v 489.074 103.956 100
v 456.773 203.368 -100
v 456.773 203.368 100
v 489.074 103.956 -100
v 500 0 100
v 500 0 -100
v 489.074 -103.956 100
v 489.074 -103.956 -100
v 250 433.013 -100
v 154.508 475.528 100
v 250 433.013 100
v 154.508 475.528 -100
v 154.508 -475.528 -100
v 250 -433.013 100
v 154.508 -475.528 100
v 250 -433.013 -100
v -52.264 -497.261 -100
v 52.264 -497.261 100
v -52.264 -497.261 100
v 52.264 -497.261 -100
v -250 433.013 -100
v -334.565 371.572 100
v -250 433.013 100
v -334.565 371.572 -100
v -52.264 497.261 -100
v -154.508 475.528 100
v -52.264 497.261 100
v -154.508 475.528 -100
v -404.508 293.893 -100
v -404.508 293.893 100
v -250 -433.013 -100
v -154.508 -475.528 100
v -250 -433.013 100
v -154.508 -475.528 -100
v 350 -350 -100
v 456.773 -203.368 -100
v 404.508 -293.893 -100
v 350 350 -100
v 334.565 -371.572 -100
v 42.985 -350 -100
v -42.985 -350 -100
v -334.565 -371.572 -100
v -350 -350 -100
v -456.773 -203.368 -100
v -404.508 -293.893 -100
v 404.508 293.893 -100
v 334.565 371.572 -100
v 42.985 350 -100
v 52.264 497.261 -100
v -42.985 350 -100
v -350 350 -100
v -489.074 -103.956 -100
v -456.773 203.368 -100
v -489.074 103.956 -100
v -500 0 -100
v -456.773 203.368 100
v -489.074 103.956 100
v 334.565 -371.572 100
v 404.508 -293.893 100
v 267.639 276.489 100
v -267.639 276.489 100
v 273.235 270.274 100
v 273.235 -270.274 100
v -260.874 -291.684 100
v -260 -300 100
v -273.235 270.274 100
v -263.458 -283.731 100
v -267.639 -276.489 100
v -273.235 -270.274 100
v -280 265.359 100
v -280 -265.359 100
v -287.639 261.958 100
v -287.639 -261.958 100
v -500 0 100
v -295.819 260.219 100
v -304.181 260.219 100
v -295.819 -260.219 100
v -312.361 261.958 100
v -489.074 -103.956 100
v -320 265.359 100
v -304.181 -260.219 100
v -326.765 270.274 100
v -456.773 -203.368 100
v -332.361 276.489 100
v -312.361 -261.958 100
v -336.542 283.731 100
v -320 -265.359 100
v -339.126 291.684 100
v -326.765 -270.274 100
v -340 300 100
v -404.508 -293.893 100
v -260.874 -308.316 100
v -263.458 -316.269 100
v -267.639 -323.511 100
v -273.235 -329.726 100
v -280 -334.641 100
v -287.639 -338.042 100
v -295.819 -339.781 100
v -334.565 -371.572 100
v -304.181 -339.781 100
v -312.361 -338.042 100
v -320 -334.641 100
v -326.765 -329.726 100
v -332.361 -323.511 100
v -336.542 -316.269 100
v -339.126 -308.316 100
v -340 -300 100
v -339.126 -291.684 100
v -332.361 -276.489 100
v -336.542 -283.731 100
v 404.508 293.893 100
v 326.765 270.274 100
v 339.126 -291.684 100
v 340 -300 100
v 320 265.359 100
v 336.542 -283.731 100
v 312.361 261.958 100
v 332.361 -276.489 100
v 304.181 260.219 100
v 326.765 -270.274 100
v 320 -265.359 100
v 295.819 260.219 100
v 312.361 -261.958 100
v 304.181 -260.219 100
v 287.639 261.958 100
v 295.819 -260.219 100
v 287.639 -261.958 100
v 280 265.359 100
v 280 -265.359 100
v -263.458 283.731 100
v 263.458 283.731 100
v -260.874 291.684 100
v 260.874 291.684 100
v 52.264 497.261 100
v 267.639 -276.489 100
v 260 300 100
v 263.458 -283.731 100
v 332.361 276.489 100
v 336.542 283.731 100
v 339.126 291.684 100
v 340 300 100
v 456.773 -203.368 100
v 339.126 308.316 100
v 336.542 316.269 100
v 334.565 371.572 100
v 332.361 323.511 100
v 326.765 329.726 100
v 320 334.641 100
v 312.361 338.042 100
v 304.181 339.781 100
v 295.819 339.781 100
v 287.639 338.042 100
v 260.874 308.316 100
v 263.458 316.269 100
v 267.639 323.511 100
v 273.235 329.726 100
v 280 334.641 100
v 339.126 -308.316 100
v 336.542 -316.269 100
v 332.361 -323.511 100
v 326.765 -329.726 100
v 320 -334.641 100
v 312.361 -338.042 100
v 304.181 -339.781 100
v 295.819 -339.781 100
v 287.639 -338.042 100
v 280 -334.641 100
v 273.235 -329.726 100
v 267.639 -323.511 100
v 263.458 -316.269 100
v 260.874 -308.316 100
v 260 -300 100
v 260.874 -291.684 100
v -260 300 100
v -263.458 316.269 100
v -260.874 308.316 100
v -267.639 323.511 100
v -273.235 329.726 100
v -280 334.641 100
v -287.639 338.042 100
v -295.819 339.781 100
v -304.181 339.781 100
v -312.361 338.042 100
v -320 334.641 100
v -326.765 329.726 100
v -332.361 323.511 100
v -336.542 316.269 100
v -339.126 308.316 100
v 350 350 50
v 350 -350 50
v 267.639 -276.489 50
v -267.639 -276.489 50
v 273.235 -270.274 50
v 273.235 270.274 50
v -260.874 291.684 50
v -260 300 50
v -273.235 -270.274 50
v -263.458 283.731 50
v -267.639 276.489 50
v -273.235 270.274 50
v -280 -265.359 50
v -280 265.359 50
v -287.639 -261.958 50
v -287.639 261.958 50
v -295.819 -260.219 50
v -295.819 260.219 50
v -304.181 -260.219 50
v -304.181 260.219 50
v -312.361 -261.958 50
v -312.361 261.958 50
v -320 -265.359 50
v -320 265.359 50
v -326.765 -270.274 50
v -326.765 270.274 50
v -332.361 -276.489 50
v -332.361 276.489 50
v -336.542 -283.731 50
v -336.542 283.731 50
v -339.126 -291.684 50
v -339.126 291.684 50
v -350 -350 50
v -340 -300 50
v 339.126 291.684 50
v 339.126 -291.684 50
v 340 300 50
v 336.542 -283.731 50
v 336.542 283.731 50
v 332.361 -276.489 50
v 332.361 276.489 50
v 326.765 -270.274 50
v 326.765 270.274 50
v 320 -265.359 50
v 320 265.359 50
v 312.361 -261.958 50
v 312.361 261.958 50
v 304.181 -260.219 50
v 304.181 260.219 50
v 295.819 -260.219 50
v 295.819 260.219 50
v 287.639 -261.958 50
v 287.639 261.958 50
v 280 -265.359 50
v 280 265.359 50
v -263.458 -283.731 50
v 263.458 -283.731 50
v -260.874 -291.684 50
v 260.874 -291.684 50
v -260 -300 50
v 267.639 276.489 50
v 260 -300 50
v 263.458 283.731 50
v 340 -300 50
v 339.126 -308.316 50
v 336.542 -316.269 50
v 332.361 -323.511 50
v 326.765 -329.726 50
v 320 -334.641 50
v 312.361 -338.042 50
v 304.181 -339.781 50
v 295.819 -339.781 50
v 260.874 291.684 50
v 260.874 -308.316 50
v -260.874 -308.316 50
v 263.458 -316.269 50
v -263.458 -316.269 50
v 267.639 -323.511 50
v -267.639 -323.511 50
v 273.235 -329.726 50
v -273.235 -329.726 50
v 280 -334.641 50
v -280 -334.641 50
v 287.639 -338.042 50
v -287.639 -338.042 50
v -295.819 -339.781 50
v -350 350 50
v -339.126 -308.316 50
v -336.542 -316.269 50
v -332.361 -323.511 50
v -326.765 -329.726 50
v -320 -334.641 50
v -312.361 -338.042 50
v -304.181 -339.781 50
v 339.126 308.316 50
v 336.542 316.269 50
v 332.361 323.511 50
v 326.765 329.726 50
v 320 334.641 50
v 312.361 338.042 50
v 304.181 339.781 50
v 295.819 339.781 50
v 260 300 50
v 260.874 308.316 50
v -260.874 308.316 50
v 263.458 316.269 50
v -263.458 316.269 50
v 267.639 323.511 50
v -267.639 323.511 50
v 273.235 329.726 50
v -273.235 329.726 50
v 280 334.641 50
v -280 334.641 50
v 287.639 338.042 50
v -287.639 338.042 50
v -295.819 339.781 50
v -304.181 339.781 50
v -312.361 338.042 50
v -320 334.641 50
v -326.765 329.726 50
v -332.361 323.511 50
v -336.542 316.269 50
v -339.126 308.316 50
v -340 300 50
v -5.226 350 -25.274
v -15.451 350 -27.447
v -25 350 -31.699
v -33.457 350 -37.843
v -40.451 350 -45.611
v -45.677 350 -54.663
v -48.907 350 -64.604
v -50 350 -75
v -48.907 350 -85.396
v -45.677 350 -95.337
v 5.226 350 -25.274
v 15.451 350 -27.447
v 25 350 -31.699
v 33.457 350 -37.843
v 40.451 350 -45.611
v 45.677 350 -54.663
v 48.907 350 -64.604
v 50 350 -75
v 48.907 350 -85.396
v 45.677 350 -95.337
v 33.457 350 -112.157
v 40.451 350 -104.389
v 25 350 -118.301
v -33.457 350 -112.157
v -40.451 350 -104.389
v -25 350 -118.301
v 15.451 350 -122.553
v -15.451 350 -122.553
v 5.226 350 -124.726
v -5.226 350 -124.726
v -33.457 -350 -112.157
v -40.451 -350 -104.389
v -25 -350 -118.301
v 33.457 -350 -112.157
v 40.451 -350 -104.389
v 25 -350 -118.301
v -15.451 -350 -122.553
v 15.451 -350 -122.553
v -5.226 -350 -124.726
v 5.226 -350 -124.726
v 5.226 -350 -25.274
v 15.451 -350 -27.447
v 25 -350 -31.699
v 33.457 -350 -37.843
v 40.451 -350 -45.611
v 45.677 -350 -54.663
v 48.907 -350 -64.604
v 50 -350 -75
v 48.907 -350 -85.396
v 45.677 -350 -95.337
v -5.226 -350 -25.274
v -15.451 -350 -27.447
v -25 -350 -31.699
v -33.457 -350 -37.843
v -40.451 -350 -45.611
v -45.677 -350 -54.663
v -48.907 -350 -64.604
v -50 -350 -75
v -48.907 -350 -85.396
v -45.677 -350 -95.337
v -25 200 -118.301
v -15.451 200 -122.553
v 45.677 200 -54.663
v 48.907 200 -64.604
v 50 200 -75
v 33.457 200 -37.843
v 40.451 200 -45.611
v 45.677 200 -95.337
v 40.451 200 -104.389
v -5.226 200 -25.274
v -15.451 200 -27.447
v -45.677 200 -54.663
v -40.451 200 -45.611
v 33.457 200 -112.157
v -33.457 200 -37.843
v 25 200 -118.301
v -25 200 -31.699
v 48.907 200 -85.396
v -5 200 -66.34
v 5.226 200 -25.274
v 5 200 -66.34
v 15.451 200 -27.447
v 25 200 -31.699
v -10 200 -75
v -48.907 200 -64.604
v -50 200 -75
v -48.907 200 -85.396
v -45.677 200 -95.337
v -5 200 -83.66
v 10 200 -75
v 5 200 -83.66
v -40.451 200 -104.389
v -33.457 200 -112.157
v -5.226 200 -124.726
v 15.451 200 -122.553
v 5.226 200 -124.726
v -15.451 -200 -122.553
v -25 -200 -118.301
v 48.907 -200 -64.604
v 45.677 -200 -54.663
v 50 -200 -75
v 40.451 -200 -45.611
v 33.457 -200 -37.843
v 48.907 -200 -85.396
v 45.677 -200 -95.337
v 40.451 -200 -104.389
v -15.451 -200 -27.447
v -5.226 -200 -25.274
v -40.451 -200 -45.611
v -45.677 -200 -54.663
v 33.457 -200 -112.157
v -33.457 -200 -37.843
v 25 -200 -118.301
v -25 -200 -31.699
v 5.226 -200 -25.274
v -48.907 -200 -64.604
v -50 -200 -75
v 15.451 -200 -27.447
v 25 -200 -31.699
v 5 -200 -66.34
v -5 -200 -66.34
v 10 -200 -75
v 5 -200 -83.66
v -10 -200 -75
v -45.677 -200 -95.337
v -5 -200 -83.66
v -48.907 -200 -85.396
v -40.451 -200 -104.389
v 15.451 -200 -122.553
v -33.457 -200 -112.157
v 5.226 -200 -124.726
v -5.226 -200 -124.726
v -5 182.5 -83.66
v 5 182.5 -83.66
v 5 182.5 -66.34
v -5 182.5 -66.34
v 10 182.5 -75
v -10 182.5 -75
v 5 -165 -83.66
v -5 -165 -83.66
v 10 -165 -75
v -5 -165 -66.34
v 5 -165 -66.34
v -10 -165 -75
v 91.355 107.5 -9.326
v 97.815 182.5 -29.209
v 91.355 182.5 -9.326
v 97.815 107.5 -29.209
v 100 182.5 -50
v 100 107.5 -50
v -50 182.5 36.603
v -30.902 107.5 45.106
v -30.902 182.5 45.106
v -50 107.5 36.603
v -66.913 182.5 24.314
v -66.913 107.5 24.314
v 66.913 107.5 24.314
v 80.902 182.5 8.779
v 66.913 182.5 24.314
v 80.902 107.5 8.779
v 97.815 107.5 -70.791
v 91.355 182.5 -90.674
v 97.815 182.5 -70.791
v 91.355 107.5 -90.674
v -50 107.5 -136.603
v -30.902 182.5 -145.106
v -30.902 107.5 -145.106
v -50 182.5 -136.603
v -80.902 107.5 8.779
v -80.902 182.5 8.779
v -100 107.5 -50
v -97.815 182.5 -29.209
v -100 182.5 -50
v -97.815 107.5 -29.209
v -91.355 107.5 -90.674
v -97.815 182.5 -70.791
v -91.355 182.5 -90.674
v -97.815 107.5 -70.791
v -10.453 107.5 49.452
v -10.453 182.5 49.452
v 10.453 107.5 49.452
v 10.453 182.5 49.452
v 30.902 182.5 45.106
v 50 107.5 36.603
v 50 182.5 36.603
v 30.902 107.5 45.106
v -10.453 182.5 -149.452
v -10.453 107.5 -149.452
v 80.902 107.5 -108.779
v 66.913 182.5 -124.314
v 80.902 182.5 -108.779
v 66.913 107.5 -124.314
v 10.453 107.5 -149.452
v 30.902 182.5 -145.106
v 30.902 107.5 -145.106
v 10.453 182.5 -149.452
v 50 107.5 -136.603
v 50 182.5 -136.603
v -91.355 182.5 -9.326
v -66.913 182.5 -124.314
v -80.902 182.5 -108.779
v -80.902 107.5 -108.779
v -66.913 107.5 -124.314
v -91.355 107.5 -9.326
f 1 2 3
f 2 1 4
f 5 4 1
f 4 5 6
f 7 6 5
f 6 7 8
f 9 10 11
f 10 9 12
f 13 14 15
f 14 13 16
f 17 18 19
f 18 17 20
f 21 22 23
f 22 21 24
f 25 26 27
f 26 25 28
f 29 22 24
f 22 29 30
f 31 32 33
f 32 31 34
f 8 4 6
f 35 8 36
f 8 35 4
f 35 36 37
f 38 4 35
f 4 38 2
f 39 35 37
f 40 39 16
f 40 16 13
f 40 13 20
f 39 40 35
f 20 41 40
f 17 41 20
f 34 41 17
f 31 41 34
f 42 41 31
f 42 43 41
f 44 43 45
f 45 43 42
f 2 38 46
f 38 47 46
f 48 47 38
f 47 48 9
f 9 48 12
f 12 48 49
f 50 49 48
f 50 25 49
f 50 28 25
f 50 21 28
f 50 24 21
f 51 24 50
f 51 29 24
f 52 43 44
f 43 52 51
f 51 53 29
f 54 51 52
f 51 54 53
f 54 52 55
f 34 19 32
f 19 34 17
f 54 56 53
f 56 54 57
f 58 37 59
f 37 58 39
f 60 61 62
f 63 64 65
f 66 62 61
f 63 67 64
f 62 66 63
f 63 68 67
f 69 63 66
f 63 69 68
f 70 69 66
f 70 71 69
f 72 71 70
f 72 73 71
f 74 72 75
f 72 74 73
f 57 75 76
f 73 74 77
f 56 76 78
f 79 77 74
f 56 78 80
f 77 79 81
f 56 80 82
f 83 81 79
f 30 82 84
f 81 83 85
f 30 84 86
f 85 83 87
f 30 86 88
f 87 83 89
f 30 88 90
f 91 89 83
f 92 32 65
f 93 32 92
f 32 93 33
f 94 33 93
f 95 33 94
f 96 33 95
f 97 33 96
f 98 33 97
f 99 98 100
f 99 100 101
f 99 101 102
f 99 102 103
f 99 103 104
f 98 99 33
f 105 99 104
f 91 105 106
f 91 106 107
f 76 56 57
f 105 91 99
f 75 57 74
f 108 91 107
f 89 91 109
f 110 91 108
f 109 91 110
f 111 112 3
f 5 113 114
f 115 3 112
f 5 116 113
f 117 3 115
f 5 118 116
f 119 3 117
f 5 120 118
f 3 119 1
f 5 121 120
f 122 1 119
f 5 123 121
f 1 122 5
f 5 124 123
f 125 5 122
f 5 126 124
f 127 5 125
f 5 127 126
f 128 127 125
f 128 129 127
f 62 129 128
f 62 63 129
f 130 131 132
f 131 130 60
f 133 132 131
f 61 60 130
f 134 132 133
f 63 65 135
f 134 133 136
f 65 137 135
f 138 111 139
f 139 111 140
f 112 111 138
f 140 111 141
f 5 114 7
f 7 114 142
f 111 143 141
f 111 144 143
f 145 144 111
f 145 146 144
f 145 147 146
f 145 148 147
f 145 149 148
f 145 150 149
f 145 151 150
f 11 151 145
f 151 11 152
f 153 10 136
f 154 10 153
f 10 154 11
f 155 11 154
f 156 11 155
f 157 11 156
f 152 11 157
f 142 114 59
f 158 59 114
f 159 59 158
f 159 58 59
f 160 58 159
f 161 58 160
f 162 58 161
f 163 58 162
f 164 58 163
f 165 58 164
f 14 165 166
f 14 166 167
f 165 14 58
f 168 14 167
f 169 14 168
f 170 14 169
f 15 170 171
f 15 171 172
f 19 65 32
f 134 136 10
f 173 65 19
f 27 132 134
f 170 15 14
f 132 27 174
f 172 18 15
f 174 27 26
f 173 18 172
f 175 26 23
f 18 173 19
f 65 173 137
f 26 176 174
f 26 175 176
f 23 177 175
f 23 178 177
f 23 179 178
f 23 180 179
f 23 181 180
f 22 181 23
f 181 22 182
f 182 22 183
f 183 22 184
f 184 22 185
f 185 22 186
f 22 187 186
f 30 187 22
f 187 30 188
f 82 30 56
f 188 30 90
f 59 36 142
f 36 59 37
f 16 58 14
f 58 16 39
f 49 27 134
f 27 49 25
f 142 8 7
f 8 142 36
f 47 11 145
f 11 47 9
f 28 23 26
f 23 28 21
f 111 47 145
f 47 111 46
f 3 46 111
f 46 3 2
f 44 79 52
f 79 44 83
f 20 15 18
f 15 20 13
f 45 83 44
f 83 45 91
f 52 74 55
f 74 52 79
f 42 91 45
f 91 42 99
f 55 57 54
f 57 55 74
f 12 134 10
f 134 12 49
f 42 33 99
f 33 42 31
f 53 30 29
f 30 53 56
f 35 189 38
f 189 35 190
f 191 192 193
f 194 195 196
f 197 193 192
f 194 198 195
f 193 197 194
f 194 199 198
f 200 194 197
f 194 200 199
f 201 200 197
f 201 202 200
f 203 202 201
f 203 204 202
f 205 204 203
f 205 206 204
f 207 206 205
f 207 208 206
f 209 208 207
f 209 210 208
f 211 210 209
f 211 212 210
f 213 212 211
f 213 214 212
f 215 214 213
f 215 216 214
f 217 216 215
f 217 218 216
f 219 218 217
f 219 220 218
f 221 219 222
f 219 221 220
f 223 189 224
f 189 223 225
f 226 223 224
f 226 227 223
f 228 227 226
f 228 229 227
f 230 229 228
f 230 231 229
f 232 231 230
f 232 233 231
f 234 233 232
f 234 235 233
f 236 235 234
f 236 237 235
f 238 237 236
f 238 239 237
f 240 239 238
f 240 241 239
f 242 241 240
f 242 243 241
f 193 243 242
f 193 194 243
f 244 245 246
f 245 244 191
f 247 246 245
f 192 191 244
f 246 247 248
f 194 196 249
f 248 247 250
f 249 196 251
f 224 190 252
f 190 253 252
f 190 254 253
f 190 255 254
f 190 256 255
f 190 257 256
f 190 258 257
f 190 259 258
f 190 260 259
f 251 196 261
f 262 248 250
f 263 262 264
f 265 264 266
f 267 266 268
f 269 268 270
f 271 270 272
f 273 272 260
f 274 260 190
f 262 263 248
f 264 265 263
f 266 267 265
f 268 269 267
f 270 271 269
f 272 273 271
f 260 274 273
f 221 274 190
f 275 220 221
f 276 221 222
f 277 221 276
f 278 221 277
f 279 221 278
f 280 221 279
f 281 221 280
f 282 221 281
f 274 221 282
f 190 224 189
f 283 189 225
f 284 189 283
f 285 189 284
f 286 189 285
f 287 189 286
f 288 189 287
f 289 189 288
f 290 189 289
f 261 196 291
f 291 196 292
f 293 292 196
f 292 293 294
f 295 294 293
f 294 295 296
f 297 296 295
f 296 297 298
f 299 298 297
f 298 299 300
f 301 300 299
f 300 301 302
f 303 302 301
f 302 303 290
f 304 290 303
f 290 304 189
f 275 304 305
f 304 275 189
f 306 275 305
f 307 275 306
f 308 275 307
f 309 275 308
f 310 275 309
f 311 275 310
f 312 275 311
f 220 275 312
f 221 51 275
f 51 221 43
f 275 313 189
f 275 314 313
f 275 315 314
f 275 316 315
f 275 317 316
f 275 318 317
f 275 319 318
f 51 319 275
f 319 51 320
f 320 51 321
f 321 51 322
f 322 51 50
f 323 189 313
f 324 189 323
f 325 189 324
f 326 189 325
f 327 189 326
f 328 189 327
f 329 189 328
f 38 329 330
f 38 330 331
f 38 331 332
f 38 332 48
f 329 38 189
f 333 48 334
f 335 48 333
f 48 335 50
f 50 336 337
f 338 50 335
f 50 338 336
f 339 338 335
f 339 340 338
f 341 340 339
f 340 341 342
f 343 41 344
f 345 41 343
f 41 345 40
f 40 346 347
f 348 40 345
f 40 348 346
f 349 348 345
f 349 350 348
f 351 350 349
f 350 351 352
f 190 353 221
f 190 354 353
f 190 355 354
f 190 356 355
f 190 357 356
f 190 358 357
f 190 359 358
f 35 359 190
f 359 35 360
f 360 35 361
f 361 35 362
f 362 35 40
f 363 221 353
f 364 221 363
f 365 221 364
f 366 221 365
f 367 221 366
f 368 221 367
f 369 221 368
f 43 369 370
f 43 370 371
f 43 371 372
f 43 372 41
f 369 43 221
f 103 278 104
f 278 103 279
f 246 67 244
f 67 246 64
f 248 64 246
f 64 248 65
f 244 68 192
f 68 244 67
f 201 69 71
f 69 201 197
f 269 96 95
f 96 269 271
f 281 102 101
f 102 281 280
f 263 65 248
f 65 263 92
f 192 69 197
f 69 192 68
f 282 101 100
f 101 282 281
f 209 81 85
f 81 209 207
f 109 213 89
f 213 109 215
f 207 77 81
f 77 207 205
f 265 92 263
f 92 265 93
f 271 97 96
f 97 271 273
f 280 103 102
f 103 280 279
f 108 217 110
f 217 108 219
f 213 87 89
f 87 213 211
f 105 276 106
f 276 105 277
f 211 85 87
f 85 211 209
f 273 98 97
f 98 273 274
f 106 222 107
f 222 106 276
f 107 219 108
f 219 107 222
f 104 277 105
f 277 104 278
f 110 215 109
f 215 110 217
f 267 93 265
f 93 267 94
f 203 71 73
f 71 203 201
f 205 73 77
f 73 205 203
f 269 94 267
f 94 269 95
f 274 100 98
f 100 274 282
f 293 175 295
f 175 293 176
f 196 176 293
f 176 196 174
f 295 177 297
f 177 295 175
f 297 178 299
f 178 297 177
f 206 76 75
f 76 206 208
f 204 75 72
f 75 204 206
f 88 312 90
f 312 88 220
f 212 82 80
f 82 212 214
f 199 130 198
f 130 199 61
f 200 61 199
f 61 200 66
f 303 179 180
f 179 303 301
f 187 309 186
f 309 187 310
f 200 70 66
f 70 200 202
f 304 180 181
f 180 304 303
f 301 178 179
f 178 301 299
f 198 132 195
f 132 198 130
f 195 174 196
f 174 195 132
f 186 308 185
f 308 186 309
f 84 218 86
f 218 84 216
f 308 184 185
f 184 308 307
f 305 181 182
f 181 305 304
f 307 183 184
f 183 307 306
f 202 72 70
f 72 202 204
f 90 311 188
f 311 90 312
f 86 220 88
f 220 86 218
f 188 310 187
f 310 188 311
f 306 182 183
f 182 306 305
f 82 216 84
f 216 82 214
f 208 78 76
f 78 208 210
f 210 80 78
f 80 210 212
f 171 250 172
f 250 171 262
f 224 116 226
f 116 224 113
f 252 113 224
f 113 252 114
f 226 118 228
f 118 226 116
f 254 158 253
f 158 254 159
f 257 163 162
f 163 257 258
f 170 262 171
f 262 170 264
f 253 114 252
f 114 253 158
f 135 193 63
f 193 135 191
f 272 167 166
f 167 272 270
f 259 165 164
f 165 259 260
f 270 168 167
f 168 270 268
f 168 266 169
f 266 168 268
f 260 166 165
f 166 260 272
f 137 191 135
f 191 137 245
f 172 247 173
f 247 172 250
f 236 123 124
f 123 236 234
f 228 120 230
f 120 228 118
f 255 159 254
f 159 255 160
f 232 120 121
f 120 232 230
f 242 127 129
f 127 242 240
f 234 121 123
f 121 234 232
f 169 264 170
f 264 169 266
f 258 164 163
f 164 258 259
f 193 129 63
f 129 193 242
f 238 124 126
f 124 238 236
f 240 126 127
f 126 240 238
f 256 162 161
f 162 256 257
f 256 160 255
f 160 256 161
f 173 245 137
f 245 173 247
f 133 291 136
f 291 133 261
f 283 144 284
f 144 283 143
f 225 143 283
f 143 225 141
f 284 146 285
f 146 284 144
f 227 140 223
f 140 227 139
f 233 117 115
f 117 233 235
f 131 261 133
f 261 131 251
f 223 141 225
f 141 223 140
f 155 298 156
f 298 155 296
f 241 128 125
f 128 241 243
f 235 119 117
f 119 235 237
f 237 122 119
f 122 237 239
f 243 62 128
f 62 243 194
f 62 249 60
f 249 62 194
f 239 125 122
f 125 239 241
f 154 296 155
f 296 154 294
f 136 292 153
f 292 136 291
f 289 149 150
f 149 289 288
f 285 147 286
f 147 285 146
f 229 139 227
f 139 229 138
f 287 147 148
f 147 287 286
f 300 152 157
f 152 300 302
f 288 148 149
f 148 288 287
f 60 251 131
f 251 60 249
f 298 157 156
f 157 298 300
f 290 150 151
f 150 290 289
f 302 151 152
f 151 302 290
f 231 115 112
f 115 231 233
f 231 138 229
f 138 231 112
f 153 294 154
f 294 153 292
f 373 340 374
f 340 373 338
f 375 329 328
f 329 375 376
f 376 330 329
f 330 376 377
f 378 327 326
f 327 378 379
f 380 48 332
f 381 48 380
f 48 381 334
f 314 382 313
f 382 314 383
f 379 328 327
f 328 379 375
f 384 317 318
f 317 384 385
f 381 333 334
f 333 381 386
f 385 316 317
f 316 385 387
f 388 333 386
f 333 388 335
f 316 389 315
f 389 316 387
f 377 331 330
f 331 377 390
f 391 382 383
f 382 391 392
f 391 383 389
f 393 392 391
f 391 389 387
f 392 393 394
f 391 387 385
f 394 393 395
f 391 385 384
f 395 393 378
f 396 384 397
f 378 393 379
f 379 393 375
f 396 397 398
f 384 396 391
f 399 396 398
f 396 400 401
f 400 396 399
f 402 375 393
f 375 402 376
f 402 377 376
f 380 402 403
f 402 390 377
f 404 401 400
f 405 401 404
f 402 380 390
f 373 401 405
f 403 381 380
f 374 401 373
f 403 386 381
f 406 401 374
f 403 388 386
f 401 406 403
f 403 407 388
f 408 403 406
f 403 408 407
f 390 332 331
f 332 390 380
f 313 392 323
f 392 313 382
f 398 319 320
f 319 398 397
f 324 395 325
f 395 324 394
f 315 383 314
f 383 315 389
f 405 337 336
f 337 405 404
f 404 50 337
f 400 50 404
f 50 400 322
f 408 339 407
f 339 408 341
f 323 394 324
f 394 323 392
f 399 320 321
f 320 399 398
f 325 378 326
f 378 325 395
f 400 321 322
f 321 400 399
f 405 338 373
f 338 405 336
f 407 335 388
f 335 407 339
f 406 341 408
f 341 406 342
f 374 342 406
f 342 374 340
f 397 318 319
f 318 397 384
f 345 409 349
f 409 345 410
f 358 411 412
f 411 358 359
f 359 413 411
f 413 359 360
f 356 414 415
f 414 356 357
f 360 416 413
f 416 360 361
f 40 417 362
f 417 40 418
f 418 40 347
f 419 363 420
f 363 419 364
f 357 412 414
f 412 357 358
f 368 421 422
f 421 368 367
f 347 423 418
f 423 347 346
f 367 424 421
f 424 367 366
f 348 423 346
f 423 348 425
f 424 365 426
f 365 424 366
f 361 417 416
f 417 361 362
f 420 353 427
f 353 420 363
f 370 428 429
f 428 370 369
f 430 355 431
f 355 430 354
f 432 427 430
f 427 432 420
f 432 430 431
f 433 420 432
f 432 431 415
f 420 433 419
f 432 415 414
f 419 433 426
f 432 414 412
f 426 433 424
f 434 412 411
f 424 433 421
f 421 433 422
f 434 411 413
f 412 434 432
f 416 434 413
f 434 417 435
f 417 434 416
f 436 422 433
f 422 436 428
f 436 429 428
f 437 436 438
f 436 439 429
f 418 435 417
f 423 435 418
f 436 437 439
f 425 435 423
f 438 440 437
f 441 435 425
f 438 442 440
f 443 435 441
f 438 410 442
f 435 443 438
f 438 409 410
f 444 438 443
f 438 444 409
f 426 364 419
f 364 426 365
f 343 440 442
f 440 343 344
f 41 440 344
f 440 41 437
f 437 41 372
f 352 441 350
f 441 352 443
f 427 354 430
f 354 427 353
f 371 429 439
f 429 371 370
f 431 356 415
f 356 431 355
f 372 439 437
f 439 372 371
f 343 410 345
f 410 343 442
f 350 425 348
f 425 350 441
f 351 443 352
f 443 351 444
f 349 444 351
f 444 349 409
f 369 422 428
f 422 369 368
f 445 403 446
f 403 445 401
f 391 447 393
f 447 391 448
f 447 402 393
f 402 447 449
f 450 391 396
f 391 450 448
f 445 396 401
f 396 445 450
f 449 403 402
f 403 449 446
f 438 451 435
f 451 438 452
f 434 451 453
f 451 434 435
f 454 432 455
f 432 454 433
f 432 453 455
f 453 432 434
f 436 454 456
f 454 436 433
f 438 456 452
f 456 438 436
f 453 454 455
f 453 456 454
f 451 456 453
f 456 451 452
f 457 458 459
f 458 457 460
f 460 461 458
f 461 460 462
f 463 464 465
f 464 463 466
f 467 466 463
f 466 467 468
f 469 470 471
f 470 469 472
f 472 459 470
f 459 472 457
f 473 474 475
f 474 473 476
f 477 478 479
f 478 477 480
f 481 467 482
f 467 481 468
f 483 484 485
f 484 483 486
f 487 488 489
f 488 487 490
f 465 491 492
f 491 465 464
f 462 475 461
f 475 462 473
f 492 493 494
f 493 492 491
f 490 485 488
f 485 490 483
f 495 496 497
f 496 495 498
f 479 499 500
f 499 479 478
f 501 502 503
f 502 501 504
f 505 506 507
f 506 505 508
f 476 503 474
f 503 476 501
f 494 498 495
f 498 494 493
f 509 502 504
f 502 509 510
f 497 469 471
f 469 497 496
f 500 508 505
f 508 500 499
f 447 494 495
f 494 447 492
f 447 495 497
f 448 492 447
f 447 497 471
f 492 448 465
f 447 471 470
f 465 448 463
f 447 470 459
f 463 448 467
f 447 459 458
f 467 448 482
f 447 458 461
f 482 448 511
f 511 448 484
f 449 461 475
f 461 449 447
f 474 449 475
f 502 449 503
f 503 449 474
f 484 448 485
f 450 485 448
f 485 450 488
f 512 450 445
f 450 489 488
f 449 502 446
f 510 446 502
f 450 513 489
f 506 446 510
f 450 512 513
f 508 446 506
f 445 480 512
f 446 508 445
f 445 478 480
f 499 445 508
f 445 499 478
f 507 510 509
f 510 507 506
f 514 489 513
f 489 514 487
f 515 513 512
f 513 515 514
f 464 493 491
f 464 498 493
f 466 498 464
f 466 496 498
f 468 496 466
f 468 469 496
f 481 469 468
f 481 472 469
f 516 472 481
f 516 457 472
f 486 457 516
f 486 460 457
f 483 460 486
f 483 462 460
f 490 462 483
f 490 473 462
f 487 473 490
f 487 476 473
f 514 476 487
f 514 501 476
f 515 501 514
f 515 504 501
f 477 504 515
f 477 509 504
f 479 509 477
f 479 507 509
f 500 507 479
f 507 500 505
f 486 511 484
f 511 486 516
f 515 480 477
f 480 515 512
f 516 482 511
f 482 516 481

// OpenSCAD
//main body
difference(){
    cylinder(200,500,500,true);
    // square hole in middle
    translate([0,0,-100])
        cube([700,700,300], true);
    //hole 1 in corner
    translate([-300, -300, 0])
        cylinder(500, 40, 40, true);
    //hole 2 in corner
    translate([-300, 300, 0])
        cylinder(500, 40, 40, true);
    //hole 3 in corner
    translate([300, -300, 0])
        cylinder(500, 40, 40, true);
    //hole 4 in corner
    translate([300, 300, 0])
        cylinder(500, 40, 40, true);
}
//main motor left
rotate([90,0,0])
    translate([0, -75, -275])
    cylinder(150, 50, 50, true);
//main motor right
rotate([90,0,0])
    translate([0, -75, 275])
    cylinder(150, 50, 50, true);
//motor turnything left
rotate([90,0,0])
    translate([0,-75, -185]) 
    cylinder(40, 10, 10, $fn=6, true);
//motor turnything right
rotate([90,0,0])
    translate([0,-75, 185]) 
    cylinder(40, 10, 10, $fn=6, true);
//wheel left
rotate([90, 0, 0])
    translate([0, -50, -145])
    cylinder(75, 100, 100, true);
